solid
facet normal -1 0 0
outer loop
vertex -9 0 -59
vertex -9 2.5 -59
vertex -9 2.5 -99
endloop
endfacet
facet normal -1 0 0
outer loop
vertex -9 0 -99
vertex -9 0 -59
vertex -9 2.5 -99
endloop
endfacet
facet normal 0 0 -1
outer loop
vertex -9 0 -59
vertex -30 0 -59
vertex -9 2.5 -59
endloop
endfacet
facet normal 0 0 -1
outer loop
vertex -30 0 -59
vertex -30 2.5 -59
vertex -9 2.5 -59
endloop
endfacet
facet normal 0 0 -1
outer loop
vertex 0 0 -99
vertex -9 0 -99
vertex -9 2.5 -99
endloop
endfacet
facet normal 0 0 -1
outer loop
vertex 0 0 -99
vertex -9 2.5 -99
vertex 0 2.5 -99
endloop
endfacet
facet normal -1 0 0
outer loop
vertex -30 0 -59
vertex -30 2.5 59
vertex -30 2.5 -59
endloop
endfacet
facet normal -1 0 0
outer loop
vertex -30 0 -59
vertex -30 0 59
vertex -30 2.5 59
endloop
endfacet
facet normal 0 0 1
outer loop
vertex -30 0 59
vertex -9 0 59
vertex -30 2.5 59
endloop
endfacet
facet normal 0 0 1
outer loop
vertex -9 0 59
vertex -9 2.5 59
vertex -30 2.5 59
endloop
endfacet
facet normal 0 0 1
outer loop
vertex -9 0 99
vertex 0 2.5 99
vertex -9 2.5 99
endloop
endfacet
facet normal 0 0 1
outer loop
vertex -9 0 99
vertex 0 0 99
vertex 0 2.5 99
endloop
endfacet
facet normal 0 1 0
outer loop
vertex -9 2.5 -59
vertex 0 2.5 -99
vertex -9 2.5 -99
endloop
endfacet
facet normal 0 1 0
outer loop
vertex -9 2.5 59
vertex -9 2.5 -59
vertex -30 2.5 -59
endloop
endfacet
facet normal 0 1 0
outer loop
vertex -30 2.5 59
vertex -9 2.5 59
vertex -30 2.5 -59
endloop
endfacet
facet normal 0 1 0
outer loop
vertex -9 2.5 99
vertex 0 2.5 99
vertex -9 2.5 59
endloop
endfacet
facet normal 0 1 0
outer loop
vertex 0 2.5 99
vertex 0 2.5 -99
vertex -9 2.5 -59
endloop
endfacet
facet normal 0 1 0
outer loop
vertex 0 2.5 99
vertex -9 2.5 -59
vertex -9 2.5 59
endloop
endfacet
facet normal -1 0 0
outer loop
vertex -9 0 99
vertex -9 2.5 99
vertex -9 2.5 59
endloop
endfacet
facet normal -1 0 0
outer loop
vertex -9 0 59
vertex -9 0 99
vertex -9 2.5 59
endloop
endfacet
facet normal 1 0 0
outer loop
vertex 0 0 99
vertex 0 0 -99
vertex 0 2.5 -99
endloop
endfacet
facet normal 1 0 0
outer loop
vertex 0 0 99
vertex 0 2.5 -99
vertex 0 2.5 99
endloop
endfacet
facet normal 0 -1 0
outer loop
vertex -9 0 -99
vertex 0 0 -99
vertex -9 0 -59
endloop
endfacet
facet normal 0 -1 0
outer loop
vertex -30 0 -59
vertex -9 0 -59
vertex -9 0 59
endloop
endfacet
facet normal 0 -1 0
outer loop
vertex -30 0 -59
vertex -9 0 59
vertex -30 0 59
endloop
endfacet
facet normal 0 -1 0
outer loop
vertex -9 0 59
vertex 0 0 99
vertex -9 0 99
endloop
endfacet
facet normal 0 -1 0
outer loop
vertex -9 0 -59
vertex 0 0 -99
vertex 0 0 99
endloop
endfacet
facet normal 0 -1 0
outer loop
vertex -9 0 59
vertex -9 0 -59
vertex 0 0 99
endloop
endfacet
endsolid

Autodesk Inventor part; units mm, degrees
ref_plane "YZ Plane" through (0, 0, 0) normal (1, 0, 0) x (0, 1, 0)
ref_plane "XZ Plane" through (0, 0, 0) normal (0, 1, 0) x (-1, 0, 0)
ref_plane "XY Plane" through (0, 0, 0) normal (0, 0, 1) x (1, 0, 0)
sketch "スケッチ1" plane through (0, 0, 0) normal (0, 1, 0) x (-1, 0, 0)
  line L0 (0, 99) -> (30, 99)
  line L1 (30, 99) -> (30, -99)
  line L2 (30, -99) -> (0, -99)
  line L3 (0, -99) -> (0, 99)
  point P0 (0, 0)
  point P1 (0, 0)
  dimension "d0" = 198
  dimension "d1" = 30
extrude "押し出し1" add sketch "スケッチ1" along normal blind 2.5
sketch "スケッチ2" plane through (0, 2.5, 0) normal (0, 1, 0) x (1, 0, 0)
  line L0 (-30, 99) -> (-30, -99) projected
  line L1 (-30, -99) -> (-9, -99)
  line L2 (-9, -99) -> (-9, -59)
  line L3 (-9, -59) -> (-30, -59)
  line L4 (-30, -59) -> (-30, -99)
  point P0 (0, 0)
  dimension "d4" = 40
  dimension "d7" = 21
extrude "押し出し2" cut sketch "スケッチ2" against normal through all
mirror "ミラー1" about plane through (0, 0, 0) normal (0, 0, 1) of "押し出し2"
properties part number "front_upper" material "木材 (カエデ材)"
